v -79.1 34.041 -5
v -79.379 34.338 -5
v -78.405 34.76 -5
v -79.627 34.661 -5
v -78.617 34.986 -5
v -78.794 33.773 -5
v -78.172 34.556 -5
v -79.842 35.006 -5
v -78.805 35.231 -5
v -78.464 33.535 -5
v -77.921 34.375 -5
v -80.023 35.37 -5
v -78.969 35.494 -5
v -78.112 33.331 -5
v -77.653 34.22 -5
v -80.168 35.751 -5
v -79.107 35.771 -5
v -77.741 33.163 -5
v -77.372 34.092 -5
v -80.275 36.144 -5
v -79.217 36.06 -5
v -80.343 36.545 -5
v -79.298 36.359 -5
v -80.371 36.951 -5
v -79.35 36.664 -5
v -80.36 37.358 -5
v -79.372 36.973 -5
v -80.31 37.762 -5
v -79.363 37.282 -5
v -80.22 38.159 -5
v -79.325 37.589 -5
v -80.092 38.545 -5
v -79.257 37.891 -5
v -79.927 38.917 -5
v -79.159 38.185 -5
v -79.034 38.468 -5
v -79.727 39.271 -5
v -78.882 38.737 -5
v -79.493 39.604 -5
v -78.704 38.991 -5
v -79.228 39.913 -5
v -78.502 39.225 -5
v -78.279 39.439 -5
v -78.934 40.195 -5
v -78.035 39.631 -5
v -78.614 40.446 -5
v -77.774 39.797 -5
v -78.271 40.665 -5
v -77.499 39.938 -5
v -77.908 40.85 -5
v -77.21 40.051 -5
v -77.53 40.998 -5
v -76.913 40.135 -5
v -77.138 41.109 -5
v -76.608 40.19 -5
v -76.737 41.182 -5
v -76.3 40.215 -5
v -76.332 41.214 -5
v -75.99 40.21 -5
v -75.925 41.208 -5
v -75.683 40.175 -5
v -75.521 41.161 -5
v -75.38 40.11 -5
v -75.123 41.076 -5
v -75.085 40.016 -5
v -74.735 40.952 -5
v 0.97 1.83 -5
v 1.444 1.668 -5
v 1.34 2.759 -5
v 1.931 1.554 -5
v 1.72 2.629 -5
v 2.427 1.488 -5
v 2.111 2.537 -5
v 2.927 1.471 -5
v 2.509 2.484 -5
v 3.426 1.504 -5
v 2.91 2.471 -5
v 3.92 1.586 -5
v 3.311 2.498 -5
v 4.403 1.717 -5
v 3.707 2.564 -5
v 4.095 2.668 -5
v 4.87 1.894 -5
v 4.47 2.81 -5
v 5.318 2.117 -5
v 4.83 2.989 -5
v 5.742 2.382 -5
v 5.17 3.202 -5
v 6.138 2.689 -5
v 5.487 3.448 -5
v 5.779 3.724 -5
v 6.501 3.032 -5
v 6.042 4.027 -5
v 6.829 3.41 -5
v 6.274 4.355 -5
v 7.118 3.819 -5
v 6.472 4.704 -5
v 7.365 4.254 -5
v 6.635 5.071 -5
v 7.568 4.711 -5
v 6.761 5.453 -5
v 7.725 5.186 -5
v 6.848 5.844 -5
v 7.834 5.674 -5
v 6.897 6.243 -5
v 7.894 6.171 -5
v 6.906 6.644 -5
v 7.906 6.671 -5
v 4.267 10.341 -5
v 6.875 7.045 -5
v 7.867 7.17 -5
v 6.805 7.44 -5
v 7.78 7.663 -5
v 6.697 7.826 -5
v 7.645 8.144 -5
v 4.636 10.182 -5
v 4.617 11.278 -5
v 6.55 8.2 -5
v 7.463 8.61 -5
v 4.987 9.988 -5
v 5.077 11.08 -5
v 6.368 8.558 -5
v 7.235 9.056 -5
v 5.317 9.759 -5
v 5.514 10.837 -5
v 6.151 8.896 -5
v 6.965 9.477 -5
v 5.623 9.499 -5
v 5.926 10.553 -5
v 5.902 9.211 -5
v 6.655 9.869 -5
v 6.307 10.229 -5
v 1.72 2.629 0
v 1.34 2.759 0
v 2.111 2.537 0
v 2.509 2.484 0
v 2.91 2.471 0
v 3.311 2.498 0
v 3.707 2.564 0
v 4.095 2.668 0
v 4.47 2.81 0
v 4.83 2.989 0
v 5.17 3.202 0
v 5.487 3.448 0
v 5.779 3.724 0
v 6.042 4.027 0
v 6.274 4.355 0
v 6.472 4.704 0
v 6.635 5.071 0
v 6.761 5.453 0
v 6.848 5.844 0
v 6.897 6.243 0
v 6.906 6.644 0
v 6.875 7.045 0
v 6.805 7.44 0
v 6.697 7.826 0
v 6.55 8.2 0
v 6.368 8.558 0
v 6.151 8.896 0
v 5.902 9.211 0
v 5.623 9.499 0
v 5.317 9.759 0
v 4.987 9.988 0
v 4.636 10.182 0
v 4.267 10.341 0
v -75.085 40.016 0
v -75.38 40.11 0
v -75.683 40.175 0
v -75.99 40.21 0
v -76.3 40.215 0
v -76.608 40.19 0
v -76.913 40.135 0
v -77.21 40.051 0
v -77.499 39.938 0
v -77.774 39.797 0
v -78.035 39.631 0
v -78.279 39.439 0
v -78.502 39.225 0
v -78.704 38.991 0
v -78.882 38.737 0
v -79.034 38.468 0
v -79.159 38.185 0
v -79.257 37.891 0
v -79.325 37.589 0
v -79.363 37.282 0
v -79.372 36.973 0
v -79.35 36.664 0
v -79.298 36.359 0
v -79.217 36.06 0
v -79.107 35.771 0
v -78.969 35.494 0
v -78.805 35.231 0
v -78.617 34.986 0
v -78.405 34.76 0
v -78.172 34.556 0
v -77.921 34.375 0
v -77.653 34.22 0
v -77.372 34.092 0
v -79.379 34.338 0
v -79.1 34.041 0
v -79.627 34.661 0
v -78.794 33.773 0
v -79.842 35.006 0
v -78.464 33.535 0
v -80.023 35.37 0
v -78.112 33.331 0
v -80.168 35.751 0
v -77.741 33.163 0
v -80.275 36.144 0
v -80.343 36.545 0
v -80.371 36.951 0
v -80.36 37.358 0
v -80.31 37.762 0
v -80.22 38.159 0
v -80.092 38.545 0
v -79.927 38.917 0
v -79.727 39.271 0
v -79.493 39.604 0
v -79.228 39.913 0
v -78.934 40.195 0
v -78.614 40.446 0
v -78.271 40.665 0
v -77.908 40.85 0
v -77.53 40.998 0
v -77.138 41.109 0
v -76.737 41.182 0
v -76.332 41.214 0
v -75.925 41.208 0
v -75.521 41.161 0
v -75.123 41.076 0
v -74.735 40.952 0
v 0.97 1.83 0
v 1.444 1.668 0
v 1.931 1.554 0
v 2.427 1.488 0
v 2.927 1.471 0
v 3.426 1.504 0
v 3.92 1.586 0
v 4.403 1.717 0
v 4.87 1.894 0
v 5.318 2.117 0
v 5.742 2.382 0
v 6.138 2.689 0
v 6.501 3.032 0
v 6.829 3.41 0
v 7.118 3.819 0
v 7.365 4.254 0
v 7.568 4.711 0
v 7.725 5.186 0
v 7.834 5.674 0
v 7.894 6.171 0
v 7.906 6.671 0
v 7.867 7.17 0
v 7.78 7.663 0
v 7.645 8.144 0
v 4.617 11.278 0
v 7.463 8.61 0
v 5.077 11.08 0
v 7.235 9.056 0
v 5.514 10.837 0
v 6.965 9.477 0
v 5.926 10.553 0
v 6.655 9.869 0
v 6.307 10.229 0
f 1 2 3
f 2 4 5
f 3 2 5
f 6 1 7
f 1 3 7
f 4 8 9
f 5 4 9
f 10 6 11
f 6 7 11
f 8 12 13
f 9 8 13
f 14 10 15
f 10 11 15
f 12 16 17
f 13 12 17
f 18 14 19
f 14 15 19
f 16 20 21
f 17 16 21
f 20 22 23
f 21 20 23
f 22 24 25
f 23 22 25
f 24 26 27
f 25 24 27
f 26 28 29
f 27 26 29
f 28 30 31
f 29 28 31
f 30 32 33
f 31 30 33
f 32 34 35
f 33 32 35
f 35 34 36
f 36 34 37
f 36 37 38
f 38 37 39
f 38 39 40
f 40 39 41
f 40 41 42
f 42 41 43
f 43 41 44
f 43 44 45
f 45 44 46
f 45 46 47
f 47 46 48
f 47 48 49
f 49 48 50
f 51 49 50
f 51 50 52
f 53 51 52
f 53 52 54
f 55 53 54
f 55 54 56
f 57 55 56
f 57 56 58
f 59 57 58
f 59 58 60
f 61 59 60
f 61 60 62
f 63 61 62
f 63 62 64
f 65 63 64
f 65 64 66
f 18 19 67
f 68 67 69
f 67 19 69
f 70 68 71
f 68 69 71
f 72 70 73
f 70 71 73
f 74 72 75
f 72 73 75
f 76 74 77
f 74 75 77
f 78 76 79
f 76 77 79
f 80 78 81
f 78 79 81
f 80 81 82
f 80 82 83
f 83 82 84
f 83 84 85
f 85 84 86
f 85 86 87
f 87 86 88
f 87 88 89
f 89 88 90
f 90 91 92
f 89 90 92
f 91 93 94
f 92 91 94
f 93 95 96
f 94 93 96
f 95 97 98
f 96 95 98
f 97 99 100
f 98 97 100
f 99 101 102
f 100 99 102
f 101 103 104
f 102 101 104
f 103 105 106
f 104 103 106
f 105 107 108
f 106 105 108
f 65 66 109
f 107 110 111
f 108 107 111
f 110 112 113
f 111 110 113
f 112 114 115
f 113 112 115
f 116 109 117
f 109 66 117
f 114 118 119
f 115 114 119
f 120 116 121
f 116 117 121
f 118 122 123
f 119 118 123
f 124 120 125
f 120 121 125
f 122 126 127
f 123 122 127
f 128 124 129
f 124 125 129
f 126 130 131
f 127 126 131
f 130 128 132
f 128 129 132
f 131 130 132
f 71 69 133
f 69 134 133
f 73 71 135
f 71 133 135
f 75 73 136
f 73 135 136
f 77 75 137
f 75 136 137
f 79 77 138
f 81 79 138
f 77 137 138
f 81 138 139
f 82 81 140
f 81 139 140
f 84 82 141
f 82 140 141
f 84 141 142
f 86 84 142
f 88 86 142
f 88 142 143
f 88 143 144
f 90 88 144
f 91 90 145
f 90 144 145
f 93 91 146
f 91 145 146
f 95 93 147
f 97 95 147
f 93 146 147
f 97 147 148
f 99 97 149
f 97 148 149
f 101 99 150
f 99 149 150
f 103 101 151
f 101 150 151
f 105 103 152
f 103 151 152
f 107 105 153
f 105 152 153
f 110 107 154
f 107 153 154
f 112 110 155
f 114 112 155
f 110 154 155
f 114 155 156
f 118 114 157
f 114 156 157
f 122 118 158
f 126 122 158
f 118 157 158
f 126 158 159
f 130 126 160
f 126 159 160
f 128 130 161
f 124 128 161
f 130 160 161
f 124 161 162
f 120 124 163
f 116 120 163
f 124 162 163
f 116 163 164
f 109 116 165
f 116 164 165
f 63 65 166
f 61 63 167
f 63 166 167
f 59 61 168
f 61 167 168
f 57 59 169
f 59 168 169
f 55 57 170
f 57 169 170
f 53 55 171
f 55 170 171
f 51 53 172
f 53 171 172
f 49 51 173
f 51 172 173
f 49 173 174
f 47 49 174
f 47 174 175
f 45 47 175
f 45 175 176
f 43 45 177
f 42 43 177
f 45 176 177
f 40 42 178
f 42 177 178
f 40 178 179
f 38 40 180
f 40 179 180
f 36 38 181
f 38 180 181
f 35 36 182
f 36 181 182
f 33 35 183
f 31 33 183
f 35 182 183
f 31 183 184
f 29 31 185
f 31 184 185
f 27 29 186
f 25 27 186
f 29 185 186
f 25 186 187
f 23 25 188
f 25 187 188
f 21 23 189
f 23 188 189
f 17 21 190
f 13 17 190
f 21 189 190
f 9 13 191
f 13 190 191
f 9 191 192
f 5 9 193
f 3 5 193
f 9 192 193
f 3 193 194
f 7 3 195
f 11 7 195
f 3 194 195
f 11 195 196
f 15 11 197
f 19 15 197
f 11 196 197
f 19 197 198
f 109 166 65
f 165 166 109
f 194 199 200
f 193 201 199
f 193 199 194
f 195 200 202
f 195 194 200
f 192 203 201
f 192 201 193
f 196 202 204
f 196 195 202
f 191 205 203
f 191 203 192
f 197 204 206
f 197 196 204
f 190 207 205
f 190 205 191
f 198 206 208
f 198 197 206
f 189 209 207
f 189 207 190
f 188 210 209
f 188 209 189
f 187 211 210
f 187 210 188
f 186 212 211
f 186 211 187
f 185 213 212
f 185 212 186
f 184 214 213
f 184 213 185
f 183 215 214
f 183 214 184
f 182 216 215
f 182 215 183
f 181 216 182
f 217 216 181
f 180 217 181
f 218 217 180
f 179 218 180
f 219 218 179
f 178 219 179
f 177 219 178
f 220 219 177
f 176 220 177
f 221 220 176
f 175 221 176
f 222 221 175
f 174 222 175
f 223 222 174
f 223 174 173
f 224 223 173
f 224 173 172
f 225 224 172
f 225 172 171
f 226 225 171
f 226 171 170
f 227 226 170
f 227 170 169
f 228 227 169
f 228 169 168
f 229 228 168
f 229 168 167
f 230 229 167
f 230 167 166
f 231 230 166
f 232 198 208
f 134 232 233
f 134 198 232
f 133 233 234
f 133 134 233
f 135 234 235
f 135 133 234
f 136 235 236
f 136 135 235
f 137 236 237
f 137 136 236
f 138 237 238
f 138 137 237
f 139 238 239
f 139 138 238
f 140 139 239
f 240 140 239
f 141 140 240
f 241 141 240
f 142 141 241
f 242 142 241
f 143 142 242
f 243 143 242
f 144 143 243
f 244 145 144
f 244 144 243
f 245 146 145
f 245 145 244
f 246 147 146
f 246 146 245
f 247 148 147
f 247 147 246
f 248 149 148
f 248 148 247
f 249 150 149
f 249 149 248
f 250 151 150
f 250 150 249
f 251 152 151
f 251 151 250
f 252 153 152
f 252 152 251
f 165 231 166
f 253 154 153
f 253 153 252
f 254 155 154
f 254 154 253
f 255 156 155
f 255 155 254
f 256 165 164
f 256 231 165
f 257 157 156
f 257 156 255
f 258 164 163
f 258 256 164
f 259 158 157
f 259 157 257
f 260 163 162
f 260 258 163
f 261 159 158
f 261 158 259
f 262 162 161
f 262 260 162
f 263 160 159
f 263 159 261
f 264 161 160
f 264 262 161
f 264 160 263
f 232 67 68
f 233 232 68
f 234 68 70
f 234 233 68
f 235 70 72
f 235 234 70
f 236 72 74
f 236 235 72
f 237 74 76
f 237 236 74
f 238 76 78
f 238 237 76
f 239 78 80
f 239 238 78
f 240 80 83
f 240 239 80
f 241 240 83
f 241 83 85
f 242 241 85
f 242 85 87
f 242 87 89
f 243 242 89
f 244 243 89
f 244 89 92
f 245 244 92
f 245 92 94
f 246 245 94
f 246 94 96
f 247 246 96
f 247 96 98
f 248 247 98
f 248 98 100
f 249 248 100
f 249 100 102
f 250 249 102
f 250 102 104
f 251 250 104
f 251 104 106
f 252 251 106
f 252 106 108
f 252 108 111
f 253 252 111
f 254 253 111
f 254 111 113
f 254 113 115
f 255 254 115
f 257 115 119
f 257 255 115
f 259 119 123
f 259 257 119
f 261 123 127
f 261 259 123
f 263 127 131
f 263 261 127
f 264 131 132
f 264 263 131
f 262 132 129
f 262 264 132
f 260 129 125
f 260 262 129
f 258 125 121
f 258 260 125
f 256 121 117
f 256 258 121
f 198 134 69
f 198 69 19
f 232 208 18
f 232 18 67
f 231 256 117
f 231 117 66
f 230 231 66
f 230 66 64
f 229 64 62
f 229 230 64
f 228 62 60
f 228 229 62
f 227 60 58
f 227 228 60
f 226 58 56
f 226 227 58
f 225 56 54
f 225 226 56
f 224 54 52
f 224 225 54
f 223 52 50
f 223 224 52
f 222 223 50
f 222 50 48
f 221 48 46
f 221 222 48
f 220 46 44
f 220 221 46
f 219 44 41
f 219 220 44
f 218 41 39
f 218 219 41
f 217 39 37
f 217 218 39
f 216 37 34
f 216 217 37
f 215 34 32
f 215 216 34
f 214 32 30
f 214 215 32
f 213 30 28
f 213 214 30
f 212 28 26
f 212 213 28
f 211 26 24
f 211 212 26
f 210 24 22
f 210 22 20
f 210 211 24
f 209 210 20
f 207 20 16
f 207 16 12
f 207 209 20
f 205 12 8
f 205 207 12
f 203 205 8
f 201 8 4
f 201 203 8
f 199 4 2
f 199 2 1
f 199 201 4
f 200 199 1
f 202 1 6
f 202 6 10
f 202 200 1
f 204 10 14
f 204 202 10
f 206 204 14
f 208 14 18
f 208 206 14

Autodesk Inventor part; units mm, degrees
ref_plane "YZ Plane" through (0, 0, 0) normal (1, 0, 0) x (0, 1, 0)
ref_plane "XZ Plane" through (0, 0, 0) normal (0, 1, 0) x (-1, 0, 0)
ref_plane "XY Plane" through (0, 0, 0) normal (0, 0, 1) x (1, 0, 0)
sketch "Sketch1" plane through (0, 0, 0) normal (0, 0, 1) x (1, 0, 0)
  circle A0 centre (2.8434, 6.5346) radius 4.064 construction
  circle A1 centre (-76.1973, 37.0416) radius 3.9624 construction
  arc A2 (-75.0852, 40.0155) -> (-77.3716, 34.0917) centre (-76.1973, 37.0416) ccw
  line L0 (-75.0852, 40.0155) -> (4.2669, 10.3412)
  line L1 (1.3404, 2.7588) -> (-77.3716, 34.0917)
  arc A3 (1.3404, 2.7588) -> (4.2669, 10.3412) centre (2.8434, 6.5346) ccw
  line L2 (4.6172, 11.2778) -> (-74.7349, 40.9521)
  arc A4 (-74.7349, 40.9521) -> (-77.7414, 33.1626) centre (-76.1973, 37.0416) ccw
  line L3 (-77.7414, 33.1626) -> (0.9705, 1.8297)
  arc A5 (0.9705, 1.8297) -> (4.6172, 11.2778) centre (2.8434, 6.5346) ccw
  point P0 (0, 0)
  dimension "d0" = 6.35
  dimension "d1" = 1
extrude "Extrusion1" add sketch "Sketch1" against normal blind 5
properties part number "Single Indexer tensioner band"
